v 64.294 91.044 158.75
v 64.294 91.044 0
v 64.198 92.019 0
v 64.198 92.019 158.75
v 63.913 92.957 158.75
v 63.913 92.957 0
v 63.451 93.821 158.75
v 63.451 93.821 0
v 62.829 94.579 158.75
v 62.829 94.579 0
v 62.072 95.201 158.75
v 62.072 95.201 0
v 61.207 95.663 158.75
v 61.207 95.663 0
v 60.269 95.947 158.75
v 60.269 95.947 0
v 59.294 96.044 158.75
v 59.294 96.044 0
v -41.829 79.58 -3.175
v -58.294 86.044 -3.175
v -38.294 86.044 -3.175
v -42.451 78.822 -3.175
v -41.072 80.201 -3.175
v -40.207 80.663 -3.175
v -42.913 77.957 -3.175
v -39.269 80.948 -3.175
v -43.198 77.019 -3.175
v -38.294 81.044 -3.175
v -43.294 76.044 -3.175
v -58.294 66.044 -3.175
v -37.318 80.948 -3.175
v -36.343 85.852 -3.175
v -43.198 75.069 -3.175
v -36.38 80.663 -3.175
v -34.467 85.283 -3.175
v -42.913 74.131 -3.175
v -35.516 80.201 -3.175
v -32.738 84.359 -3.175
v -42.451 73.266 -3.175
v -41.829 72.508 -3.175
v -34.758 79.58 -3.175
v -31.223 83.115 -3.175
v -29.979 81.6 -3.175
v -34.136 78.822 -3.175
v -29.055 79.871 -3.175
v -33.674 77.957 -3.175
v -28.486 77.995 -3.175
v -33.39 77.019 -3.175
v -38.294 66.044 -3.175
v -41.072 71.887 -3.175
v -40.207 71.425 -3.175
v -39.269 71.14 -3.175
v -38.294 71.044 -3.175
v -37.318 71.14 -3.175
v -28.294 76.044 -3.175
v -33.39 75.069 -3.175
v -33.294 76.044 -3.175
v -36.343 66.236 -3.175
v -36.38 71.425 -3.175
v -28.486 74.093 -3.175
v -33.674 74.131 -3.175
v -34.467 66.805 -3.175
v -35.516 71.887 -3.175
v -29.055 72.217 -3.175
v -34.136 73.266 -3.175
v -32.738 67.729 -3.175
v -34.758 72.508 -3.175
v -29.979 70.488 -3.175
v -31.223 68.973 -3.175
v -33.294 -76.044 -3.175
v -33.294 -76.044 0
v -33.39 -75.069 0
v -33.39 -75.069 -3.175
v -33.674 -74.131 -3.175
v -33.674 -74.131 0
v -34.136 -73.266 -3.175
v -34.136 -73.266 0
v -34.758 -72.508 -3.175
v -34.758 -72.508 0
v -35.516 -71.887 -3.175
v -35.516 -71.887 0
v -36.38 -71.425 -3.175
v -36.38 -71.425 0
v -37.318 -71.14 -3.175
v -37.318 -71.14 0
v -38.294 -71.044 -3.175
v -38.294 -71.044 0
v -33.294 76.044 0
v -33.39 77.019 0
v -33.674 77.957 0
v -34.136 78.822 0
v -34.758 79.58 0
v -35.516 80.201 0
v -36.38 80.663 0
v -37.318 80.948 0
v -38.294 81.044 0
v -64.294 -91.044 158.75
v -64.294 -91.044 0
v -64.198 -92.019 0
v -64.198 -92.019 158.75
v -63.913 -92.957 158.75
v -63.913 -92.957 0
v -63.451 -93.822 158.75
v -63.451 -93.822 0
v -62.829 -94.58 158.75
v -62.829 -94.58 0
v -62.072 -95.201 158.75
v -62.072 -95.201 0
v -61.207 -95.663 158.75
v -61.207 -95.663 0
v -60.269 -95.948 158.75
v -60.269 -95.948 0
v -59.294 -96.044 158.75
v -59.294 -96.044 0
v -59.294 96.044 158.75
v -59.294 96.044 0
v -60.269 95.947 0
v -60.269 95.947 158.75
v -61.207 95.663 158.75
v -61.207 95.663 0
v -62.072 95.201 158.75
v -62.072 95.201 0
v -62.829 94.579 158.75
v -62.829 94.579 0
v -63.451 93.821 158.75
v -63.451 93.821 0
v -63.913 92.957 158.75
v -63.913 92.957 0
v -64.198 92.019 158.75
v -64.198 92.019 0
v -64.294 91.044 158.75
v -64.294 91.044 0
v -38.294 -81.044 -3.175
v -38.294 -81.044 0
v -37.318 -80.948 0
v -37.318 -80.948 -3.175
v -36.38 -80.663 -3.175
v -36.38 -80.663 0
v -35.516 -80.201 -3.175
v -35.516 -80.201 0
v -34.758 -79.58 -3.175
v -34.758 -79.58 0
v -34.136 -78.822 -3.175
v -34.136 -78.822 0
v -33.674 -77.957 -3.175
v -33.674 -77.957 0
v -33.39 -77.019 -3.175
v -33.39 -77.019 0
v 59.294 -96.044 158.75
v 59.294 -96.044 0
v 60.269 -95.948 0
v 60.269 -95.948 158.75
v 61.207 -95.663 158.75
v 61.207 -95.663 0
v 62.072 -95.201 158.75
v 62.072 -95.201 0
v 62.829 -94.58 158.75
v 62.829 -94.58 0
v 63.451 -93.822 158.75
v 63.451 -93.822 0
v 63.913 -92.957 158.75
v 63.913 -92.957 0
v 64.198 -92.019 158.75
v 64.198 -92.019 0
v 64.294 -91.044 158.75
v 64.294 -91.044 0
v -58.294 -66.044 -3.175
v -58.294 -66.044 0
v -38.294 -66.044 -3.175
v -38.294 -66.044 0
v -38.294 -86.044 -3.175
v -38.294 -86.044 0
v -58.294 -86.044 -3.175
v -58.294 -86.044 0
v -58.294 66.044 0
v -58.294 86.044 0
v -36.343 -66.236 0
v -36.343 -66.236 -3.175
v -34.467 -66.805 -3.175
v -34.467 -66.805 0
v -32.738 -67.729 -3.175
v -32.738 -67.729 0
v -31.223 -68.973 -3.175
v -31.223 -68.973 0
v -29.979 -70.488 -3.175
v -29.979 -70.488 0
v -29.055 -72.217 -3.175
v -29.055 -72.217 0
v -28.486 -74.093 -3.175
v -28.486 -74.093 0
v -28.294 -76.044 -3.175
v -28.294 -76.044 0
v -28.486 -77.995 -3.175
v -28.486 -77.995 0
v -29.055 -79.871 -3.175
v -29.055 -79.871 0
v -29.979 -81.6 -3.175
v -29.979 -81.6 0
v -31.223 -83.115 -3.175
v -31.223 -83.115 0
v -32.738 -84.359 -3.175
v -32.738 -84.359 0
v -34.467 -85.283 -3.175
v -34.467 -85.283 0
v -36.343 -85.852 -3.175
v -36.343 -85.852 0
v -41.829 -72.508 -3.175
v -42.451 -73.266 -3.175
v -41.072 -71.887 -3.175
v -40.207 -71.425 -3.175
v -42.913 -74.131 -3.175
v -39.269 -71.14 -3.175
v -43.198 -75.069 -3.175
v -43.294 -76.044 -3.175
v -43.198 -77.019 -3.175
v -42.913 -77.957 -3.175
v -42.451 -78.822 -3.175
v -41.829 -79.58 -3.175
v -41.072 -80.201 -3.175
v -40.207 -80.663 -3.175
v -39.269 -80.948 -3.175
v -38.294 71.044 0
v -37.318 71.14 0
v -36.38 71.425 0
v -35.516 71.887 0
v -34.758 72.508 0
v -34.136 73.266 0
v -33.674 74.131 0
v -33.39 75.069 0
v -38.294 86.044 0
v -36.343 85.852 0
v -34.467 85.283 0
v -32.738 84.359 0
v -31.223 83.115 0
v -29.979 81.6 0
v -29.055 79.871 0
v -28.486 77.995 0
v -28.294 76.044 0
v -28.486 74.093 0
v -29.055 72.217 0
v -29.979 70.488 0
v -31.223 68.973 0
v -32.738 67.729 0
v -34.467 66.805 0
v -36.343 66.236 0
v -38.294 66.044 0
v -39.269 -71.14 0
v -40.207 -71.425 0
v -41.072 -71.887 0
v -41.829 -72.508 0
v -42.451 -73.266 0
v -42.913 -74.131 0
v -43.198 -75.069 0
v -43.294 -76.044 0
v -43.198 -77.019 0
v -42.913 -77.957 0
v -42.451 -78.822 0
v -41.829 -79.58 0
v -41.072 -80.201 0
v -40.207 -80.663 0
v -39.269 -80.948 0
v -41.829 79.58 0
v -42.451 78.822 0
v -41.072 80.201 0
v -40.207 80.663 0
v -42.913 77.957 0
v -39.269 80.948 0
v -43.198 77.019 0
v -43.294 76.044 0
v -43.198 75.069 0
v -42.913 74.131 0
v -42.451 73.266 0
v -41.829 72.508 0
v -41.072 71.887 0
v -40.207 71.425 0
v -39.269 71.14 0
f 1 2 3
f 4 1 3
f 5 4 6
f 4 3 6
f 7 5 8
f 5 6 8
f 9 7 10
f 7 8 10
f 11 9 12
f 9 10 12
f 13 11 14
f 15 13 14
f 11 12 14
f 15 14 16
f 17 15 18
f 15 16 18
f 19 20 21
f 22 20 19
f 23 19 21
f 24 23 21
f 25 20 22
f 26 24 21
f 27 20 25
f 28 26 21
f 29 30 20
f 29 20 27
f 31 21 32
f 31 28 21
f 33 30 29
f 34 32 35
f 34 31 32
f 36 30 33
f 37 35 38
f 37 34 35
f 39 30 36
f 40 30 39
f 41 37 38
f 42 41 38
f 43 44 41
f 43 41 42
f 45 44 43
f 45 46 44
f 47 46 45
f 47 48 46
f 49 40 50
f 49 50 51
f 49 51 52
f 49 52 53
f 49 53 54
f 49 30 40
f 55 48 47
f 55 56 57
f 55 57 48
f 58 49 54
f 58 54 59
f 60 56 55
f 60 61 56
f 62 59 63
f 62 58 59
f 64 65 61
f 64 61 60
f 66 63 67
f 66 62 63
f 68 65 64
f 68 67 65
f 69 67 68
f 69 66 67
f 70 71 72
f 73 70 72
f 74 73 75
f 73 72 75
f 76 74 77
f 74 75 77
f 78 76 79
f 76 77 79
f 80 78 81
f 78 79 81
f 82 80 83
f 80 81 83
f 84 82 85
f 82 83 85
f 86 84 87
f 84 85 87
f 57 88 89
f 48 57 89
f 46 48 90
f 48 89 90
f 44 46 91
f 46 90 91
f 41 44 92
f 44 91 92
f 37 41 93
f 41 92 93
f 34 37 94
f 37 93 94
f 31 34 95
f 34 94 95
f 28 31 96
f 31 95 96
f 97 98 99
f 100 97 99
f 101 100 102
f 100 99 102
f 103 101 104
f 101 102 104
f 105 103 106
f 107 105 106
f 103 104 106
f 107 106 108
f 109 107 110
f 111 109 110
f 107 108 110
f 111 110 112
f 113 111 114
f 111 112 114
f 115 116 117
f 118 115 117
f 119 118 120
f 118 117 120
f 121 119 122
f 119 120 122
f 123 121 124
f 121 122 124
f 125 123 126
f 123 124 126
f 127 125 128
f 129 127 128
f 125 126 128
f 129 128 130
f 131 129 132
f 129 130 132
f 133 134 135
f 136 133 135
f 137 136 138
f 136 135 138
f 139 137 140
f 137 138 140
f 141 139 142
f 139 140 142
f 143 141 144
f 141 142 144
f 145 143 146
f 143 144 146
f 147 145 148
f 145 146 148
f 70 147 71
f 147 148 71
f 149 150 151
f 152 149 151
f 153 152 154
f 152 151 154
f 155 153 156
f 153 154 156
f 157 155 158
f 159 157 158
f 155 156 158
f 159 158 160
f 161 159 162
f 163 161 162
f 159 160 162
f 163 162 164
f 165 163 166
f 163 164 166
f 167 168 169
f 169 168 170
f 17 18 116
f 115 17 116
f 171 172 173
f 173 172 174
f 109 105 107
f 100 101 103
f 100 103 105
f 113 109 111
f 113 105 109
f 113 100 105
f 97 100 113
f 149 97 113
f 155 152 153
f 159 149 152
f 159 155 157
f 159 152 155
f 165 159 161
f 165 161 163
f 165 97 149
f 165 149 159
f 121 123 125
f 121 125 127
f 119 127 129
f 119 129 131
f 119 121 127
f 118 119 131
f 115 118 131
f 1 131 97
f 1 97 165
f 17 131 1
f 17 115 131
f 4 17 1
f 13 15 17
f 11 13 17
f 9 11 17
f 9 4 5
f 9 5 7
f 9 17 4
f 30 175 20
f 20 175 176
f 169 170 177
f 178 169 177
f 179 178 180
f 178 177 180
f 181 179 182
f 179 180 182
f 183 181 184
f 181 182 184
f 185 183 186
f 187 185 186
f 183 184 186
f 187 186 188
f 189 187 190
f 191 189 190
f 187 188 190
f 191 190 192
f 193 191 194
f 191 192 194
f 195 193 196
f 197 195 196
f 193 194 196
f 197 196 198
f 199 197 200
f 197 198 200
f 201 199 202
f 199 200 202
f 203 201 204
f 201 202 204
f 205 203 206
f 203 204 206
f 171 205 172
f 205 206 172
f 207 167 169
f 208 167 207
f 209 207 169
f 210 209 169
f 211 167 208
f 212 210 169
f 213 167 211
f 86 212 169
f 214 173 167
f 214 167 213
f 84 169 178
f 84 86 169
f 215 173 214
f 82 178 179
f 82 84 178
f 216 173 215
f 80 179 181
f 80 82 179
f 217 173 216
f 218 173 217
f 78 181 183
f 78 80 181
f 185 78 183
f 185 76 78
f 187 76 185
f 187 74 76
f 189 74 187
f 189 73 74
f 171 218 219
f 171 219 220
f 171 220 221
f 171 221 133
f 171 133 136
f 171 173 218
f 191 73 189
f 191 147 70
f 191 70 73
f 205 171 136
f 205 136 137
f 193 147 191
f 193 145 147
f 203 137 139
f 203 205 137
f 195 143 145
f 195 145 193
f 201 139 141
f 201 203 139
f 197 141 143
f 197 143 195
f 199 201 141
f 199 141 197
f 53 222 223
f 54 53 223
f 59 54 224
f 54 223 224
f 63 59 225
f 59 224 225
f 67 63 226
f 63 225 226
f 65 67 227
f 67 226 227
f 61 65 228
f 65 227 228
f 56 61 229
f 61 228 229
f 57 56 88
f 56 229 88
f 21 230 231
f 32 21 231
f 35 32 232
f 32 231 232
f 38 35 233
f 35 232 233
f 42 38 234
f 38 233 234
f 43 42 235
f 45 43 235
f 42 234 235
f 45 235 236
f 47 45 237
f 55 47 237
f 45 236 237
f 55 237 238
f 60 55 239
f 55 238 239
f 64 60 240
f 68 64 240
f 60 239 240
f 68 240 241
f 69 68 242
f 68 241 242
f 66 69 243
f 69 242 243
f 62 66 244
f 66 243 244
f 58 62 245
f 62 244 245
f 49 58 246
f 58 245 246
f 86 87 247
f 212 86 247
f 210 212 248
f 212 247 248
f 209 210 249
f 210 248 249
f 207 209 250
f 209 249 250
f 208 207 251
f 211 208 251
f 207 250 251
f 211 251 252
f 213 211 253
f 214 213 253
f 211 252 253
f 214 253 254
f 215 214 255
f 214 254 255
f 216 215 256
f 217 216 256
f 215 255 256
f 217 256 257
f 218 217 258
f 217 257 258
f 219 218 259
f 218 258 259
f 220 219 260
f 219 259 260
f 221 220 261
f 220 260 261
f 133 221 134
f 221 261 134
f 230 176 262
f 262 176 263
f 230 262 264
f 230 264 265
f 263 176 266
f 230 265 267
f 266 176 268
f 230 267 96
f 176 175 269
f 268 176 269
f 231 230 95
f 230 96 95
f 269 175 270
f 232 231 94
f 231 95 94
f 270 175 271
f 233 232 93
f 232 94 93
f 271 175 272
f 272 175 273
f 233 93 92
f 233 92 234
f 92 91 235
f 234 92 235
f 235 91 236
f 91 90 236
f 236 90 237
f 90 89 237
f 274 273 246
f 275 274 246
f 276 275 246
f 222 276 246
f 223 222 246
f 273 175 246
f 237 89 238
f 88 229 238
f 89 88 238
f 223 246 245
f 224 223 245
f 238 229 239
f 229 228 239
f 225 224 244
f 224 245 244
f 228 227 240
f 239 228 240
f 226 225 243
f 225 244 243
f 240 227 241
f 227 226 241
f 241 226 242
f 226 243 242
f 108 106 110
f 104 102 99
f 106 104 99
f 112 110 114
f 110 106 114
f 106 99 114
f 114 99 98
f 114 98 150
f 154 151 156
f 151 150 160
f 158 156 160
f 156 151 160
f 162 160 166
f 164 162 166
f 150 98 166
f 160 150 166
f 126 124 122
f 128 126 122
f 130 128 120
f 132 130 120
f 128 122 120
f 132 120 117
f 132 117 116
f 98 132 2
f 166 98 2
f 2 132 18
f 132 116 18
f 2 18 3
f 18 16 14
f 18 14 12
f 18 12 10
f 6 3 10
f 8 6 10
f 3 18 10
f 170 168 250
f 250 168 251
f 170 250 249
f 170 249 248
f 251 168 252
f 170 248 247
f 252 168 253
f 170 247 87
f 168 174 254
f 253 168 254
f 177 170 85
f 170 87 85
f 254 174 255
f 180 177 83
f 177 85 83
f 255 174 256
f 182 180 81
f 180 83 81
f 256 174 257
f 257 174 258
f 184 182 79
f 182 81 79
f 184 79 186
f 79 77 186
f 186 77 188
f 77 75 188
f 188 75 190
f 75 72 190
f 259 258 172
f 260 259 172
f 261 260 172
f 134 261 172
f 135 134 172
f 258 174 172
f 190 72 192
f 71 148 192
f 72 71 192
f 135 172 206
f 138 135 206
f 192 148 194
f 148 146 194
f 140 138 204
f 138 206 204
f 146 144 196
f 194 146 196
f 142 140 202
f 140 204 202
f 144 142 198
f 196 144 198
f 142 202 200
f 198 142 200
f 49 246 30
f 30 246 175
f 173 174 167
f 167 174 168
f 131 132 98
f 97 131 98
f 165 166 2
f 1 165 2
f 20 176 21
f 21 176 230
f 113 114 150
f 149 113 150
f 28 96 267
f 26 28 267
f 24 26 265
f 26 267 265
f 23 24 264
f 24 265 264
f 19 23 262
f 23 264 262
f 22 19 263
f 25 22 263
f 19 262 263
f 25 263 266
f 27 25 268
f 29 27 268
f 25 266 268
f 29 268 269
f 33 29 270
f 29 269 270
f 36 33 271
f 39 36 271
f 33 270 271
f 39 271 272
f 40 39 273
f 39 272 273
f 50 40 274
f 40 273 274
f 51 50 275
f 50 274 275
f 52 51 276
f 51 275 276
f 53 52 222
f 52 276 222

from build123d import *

# Parameters (mm, degrees)
F1_DEPTH = 158.75
F3_DEPTH = 3.175


with BuildPart() as f1:
    # F0 (on Top) → F1 (new body)
    with BuildSketch(Plane.XY):
        with BuildLine():
            ThreePointArc((-64.29375, -91.044), (-62.829284, -94.579534), (-59.29375, -96.044))
            Line((-59.29375, -96.044), (59.29375, -96.044))
            ThreePointArc((59.29375, -96.044), (62.829284, -94.579534), (64.29375, -91.044))
            Line((64.29375, -91.044), (64.29375, 91.0435))
            ThreePointArc((64.29375, 91.0435), (62.829284, 94.579034), (59.29375, 96.0435))
            Line((59.29375, 96.0435), (-59.29375, 96.0435))
            ThreePointArc((-59.29375, 96.0435), (-62.829284, 94.579034), (-64.29375, 91.0435))
            Line((-64.29375, 91.0435), (-64.29375, -91.044))
        make_face()
    extrude(amount=F1_DEPTH)


with BuildPart() as f3:
    # F2 (on face) → F3 (new body)
    with BuildSketch(Plane(origin=(0, 0, 0), x_dir=(1, 0, 0), z_dir=(0, 0, -1))):
        with BuildLine():
            Line((-38.29375, 81.044), (-38.29375, 86.044))
            Line((-38.29375, 86.044), (-58.29375, 86.044))
            Line((-58.29375, 86.044), (-58.29375, 66.044))
            Line((-58.29375, 66.044), (-38.29375, 66.044))
            Line((-38.29375, 66.044), (-38.29375, 71.044))
            ThreePointArc((-38.29375, 71.044), (-43.29375, 76.044), (-38.29375, 81.044))
        make_face()
        with BuildLine():
            ThreePointArc((-38.29375, 66.044), (-28.29375, 76.044), (-38.29375, 86.044))
            Line((-38.29375, 86.044), (-38.29375, 81.044))
            ThreePointArc((-38.29375, 81.044), (-34.758216, 79.579534), (-33.29375, 76.044))
            ThreePointArc((-33.29375, 76.044), (-34.758216, 72.508466), (-38.29375, 71.044))
            Line((-38.29375, 71.044), (-38.29375, 66.044))
        make_face()
        with BuildLine():
            Line((-58.29375, -86.044), (-38.29375, -86.044))
            Line((-38.29375, -86.044), (-38.29375, -81.044))
            ThreePointArc((-38.29375, -81.044), (-43.29375, -76.044), (-38.29375, -71.044))
            Line((-38.29375, -71.044), (-38.29375, -66.044))
            Line((-38.29375, -66.044), (-58.29375, -66.044))
            Line((-58.29375, -66.044), (-58.29375, -86.044))
        make_face()
        with BuildLine():
            Line((-38.29375, -81.044), (-38.29375, -86.044))
            ThreePointArc((-38.29375, -86.044), (-28.29375, -76.044), (-38.29375, -66.044))
            Line((-38.29375, -66.044), (-38.29375, -71.044))
            ThreePointArc((-38.29375, -71.044), (-34.758216, -72.508466), (-33.29375, -76.044))
            ThreePointArc((-33.29375, -76.044), (-34.758216, -79.579534), (-38.29375, -81.044))
        make_face()
    extrude(amount=F3_DEPTH)


solid = Compound([f1.part, f3.part])
